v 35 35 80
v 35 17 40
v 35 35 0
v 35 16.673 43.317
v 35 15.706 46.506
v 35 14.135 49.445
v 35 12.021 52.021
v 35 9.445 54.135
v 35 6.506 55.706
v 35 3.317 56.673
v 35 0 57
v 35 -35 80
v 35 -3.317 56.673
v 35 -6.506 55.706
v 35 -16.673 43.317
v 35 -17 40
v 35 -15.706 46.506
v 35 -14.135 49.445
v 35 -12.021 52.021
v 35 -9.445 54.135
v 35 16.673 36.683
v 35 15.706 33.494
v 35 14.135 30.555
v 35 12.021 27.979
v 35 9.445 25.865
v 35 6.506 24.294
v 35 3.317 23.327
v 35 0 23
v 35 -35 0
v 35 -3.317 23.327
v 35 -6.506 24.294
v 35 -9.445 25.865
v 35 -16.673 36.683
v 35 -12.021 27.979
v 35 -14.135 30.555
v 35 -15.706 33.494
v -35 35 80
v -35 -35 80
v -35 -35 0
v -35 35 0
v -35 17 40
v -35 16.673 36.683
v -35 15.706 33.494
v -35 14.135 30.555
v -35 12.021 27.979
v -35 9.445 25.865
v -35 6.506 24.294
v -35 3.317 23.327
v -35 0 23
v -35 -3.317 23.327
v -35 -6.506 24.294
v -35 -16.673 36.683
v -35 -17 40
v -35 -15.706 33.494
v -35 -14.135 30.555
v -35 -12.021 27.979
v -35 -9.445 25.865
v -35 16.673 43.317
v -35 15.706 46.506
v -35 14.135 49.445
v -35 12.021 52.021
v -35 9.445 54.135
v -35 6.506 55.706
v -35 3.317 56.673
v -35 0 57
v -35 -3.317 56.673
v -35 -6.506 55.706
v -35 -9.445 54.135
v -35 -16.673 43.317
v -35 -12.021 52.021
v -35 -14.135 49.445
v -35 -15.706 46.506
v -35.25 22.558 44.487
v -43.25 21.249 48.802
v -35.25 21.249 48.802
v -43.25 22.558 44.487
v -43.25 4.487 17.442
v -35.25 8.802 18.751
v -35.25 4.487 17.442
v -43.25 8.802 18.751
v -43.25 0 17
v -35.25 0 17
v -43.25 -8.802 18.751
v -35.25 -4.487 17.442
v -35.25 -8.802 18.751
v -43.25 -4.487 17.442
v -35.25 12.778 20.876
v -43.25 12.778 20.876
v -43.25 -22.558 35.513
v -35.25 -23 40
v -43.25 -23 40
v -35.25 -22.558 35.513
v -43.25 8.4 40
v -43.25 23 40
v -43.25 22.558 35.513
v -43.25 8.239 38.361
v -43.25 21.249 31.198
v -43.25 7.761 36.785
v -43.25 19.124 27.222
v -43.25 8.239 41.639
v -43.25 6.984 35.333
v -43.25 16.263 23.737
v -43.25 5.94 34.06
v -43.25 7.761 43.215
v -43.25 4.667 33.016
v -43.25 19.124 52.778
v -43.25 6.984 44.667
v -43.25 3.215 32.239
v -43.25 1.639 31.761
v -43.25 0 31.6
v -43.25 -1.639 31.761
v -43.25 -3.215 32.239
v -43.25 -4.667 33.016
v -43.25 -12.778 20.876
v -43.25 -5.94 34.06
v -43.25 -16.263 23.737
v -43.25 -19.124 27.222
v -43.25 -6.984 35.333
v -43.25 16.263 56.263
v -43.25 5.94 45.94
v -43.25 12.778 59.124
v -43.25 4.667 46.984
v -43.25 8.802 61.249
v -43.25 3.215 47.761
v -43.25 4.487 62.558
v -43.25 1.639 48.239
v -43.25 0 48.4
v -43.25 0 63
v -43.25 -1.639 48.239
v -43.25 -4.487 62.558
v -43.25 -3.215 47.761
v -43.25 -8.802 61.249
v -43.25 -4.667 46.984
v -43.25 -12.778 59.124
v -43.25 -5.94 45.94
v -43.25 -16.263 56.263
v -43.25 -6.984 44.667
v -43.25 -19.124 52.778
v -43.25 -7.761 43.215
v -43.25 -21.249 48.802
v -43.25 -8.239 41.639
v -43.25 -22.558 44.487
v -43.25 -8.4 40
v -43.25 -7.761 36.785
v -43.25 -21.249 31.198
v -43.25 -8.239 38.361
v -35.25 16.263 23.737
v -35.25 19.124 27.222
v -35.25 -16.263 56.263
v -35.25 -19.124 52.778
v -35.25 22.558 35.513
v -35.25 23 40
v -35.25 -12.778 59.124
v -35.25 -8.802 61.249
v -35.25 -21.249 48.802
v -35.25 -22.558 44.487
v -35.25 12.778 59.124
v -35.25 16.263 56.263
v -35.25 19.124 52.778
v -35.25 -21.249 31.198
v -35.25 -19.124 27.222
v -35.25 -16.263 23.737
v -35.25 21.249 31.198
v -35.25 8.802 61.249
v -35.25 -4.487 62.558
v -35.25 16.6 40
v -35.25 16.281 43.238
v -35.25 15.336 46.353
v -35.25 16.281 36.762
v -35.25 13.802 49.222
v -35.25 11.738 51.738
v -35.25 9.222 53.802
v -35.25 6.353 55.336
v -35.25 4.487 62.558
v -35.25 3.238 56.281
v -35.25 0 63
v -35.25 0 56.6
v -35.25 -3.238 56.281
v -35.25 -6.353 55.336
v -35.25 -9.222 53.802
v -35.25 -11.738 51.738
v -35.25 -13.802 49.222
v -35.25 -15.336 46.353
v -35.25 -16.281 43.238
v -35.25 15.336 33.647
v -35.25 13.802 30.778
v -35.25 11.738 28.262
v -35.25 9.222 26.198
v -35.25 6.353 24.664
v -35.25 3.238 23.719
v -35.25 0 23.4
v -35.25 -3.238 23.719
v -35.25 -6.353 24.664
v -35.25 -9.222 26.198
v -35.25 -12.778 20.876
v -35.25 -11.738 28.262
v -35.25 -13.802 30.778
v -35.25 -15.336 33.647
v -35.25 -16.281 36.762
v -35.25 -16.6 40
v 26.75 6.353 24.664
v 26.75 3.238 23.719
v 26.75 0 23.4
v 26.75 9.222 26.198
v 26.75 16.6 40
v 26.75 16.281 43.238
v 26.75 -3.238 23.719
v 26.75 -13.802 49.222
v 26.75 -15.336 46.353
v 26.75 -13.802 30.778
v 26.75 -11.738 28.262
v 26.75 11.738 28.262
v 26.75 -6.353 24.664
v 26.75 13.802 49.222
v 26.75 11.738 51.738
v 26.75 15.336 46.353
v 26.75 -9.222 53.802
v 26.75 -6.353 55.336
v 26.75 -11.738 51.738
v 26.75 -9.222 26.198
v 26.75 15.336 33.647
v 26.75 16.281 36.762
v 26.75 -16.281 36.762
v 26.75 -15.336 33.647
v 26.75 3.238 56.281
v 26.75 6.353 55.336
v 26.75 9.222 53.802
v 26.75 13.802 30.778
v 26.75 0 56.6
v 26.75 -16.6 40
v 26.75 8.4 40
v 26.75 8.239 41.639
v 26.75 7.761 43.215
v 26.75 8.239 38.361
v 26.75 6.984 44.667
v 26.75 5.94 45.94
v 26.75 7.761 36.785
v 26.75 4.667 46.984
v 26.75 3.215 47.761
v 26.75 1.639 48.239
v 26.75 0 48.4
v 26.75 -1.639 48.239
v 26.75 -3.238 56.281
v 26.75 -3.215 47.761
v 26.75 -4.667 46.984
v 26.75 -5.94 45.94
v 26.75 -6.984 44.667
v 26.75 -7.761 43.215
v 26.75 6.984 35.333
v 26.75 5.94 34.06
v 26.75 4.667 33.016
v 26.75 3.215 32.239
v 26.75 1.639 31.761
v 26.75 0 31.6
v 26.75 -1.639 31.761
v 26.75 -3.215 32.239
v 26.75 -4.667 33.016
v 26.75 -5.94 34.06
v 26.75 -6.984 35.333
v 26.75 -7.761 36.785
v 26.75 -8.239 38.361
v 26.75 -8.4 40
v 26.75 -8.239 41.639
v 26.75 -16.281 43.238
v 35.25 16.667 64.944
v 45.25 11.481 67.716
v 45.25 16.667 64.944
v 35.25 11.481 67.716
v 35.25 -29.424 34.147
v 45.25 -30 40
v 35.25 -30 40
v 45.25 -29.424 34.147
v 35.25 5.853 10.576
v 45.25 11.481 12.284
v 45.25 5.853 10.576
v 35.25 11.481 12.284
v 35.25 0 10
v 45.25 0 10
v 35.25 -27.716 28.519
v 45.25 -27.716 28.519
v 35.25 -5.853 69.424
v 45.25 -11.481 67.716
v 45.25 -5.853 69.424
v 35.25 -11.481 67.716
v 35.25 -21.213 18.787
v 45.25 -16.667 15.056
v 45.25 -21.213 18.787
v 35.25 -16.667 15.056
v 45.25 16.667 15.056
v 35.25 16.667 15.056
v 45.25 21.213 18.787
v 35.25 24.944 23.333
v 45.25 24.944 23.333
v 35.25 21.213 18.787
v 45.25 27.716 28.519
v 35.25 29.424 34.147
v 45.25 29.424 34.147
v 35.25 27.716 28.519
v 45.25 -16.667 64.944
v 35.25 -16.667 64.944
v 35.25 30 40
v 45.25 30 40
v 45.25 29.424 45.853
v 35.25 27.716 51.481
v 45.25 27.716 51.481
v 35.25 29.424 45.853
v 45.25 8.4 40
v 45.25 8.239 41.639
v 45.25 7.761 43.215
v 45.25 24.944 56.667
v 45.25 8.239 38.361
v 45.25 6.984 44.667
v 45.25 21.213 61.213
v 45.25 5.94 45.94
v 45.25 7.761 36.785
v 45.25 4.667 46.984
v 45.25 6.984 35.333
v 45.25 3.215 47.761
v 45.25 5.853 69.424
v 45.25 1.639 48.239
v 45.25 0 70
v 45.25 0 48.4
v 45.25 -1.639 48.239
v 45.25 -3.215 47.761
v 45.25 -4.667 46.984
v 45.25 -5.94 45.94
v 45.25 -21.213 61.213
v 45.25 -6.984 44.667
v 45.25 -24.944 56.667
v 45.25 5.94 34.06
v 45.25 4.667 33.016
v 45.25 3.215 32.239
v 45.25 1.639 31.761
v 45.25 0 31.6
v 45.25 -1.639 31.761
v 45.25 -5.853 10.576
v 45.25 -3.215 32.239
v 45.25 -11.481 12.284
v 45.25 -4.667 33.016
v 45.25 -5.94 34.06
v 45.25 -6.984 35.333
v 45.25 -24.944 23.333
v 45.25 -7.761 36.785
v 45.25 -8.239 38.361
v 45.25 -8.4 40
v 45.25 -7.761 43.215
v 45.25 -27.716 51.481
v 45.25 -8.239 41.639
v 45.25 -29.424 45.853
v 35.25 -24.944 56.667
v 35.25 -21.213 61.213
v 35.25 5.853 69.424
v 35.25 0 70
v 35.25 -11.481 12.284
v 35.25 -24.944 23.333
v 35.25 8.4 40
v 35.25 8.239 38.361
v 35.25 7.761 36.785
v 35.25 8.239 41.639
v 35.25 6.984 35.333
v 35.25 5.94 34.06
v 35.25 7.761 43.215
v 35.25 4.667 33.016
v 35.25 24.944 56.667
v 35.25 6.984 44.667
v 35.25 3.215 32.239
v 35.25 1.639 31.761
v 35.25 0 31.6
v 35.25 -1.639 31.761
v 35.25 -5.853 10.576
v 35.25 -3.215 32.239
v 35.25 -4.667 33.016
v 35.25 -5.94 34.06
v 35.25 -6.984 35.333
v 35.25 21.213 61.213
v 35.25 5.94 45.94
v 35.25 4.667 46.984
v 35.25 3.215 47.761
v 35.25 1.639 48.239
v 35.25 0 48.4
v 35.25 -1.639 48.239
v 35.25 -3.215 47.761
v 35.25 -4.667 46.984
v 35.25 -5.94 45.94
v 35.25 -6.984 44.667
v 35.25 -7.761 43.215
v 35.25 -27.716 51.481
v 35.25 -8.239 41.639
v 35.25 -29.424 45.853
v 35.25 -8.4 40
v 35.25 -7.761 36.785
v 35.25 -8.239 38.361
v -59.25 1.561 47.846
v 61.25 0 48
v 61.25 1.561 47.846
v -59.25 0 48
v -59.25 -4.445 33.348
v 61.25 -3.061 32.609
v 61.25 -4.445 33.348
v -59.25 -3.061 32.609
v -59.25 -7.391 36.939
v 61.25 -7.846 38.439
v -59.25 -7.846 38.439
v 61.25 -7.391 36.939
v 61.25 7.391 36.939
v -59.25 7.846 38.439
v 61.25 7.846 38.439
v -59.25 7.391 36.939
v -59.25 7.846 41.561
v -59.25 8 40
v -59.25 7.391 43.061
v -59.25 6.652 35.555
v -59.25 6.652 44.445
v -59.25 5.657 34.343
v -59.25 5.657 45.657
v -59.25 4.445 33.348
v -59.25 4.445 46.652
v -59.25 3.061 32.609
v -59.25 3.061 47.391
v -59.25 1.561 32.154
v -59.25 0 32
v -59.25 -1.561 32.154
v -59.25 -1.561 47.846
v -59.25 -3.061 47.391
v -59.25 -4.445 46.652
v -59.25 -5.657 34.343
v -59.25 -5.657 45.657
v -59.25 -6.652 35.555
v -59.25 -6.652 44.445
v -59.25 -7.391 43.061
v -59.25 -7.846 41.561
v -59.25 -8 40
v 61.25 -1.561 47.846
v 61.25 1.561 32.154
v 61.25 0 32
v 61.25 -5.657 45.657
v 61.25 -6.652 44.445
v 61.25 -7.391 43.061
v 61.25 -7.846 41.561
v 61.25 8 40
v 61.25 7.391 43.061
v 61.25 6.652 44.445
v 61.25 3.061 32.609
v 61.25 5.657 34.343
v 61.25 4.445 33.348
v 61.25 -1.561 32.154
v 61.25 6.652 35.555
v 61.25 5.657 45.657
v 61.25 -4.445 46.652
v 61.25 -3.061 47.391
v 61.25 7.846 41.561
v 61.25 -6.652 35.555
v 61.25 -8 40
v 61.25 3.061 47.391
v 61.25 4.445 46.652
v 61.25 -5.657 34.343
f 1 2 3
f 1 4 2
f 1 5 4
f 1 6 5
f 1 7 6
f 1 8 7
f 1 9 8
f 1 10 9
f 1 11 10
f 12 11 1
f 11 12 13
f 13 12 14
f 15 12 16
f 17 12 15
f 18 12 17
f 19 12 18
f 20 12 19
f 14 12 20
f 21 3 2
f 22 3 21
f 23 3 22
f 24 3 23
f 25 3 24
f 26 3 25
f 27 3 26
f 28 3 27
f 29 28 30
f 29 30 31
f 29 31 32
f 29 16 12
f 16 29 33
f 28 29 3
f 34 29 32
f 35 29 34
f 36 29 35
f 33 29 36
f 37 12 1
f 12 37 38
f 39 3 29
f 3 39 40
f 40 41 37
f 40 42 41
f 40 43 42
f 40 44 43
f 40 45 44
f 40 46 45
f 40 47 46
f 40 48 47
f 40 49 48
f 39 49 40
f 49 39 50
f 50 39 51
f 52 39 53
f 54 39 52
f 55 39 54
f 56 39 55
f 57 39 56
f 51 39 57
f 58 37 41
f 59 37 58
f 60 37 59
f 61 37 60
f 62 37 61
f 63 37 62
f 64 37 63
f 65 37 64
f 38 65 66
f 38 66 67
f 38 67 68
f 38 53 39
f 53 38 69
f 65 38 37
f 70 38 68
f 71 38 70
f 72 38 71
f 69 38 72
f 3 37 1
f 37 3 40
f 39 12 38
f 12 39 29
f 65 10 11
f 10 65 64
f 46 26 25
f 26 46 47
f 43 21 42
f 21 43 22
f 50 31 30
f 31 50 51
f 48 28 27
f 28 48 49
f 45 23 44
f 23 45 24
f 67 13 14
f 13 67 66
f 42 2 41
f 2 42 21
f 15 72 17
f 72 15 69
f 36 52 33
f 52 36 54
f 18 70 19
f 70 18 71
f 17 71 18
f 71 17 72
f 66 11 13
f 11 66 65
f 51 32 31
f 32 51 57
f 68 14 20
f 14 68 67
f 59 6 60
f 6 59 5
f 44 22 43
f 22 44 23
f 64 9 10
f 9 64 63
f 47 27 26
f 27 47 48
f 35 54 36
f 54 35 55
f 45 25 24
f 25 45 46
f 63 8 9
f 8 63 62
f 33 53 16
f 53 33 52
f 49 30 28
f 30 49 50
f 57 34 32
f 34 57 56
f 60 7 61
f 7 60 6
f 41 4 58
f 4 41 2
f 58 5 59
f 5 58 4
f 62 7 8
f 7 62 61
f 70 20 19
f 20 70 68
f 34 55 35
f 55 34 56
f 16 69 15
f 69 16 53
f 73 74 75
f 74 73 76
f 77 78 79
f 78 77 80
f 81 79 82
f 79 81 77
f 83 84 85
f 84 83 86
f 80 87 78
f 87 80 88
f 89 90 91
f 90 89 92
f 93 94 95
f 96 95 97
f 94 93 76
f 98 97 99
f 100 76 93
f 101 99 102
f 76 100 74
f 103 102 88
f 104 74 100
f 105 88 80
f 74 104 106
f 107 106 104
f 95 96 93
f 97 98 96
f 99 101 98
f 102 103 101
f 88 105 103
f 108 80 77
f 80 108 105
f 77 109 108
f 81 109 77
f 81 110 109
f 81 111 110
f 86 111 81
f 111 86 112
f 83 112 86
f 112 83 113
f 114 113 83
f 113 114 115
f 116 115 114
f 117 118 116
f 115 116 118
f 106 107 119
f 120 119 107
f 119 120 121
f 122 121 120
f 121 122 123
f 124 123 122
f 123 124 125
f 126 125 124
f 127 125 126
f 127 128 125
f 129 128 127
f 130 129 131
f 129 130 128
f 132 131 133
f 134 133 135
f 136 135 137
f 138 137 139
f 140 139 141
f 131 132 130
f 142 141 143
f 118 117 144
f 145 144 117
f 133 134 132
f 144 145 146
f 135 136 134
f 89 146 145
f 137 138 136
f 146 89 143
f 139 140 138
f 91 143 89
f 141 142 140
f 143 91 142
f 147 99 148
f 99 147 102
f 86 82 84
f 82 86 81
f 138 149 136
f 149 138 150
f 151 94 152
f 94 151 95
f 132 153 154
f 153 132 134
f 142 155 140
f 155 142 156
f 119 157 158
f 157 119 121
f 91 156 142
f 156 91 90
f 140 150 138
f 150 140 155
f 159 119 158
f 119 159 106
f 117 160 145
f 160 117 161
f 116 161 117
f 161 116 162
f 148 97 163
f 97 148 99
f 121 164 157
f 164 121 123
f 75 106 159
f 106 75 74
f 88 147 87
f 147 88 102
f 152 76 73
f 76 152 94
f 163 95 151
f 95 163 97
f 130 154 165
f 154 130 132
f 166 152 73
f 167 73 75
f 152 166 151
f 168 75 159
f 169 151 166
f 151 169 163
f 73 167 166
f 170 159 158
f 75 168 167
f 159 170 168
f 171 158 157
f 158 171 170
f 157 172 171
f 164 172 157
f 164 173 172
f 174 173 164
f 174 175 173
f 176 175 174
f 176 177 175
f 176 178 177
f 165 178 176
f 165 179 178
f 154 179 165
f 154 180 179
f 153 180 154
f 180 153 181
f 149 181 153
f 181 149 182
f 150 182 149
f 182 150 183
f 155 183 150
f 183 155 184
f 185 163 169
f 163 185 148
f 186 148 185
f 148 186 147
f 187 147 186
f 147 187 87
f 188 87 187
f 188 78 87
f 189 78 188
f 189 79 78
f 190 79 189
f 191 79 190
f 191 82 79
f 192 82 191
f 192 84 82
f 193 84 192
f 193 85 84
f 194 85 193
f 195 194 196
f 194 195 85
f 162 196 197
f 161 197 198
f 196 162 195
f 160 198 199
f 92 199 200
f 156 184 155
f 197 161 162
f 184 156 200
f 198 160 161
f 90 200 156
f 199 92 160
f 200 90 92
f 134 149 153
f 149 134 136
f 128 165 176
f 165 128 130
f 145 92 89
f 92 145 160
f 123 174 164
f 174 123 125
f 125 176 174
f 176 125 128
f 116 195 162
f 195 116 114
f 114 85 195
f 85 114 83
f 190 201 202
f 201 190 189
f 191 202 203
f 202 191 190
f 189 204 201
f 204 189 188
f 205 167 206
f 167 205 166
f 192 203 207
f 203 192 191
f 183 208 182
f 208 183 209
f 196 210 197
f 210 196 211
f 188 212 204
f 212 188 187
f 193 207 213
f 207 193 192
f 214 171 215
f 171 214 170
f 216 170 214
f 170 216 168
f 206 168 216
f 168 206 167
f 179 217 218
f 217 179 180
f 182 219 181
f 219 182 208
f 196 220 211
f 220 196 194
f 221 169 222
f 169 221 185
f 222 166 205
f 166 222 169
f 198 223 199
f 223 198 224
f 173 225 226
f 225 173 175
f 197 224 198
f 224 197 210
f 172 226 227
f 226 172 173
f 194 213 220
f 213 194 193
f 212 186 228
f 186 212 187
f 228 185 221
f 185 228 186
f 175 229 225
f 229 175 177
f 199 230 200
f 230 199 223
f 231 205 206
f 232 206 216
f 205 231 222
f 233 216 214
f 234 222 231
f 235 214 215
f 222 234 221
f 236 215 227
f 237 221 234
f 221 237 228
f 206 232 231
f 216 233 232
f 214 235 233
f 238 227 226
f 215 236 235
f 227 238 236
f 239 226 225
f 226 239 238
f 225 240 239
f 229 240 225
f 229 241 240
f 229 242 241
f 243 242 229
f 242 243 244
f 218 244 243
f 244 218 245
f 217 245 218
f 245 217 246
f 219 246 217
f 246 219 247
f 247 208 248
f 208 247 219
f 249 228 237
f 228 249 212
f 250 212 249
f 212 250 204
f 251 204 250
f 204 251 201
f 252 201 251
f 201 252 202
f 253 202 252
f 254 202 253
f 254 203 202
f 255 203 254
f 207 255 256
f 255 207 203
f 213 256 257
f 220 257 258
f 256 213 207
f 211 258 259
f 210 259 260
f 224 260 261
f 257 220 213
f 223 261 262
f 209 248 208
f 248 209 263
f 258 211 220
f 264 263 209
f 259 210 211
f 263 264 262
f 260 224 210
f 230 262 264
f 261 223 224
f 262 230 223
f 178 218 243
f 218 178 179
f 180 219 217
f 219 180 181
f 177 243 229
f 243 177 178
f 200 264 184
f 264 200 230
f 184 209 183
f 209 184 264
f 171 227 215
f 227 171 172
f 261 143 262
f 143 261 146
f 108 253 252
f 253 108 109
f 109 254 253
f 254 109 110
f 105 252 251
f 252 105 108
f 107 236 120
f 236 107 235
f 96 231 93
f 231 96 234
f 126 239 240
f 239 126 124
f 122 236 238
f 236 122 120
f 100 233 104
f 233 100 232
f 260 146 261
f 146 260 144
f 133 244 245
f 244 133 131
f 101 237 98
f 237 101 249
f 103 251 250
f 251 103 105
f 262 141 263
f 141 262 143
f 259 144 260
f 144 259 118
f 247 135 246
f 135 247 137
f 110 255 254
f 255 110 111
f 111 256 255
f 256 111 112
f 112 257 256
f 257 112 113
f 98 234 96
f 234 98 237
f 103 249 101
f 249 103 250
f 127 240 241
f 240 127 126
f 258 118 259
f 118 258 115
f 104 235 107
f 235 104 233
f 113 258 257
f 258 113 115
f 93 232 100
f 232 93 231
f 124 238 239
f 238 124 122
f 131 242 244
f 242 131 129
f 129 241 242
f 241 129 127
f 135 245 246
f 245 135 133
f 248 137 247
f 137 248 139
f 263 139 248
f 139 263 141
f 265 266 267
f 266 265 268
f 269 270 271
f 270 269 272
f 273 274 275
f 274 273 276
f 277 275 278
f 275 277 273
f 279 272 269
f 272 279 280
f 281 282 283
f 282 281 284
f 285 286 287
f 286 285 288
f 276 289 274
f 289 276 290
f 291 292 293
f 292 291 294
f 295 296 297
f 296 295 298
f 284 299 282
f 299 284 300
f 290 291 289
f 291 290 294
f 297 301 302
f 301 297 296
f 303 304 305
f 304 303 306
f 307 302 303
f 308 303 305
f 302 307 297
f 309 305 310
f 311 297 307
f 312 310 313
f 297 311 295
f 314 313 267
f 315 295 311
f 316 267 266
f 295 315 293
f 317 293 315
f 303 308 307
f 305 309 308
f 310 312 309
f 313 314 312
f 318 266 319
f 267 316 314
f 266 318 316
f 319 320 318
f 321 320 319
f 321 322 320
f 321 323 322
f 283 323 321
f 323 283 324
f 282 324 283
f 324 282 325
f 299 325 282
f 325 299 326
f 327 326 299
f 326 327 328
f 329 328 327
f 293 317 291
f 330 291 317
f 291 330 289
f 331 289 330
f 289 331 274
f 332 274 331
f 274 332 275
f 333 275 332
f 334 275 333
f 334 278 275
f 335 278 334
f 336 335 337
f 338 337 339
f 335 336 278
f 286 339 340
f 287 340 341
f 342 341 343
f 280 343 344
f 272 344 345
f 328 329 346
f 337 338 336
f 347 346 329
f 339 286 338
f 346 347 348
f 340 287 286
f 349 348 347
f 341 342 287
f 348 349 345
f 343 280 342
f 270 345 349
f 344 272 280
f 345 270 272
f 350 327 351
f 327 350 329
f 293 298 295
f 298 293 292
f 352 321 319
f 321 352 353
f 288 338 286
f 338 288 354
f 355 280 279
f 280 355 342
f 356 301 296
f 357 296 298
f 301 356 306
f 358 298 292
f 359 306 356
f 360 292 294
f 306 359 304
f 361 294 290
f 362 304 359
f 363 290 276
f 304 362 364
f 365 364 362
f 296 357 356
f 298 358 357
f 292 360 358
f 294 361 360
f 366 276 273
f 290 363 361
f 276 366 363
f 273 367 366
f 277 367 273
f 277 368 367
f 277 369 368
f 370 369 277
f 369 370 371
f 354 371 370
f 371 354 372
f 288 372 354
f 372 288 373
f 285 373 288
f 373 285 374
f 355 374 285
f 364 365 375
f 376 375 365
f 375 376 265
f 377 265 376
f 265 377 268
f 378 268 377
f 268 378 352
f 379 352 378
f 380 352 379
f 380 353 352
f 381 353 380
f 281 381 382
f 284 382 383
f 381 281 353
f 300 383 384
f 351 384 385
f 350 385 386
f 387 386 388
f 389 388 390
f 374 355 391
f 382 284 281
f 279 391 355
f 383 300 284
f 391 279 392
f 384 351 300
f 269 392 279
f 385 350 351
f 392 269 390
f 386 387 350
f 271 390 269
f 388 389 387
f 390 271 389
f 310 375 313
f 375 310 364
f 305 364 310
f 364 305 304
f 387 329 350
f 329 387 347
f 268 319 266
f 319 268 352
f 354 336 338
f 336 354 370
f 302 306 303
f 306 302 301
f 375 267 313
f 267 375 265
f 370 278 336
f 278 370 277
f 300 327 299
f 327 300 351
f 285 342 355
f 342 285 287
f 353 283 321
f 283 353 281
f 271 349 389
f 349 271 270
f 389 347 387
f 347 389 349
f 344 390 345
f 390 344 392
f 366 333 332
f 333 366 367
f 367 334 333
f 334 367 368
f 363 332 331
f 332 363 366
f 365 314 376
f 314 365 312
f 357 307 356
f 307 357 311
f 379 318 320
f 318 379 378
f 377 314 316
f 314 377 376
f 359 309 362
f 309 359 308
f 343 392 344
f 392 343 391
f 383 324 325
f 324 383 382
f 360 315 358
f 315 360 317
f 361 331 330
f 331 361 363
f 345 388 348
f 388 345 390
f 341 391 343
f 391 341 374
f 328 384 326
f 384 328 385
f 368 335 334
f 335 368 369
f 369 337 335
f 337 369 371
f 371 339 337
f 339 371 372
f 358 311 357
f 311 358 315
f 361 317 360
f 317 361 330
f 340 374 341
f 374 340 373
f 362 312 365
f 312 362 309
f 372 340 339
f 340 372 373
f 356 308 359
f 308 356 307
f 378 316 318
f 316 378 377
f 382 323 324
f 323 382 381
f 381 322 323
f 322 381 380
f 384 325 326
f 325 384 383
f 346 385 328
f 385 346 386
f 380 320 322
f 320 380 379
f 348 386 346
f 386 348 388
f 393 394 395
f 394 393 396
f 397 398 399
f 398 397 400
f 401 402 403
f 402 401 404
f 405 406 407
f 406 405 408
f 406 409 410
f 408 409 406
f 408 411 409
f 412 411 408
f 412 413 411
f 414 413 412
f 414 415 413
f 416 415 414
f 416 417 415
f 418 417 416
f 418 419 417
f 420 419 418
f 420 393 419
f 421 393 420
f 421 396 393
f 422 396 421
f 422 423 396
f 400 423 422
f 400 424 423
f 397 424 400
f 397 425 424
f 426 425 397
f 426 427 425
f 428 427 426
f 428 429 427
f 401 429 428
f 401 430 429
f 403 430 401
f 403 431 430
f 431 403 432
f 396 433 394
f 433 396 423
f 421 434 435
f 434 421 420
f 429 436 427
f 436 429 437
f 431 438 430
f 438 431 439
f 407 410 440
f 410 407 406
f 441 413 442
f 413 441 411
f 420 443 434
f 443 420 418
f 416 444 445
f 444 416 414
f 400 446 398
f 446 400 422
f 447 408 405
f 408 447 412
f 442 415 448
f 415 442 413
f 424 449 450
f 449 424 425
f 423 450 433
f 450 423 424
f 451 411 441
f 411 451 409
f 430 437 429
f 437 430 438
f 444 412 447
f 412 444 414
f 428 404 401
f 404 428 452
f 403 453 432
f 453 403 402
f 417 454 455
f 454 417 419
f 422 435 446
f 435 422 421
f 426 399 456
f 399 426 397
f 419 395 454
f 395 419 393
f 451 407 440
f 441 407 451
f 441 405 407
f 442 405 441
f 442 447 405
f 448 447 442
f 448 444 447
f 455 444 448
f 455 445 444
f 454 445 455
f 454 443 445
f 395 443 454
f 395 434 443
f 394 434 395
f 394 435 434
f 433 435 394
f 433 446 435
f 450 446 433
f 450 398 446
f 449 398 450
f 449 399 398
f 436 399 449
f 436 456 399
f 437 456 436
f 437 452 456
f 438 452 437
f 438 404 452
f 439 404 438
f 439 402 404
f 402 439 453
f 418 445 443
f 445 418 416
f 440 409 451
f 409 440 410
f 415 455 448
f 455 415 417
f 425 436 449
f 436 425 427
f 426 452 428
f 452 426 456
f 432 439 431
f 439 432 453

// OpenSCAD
$fn = 32;

// ------------------------------------------------------------------------
// Bushed housing: 70 x 70 x 80 mm housing, bushing d33.2
// Every part is its own module, assembly() places them once.
// ------------------------------------------------------------------------

// --- part 1 ---
module housing() {
  difference() {
    translate([-35, -35, 0]) cube([70, 70, 80]);
    translate([0, 0, 40]) rotate([0, 90, 0]) cylinder(h = 72, d = 34, center = true);
  }
}

// --- part 2 ---
module bushing() {
  difference() {
    union() {
      cylinder(h = 8, d = 46);
      translate([0, 0, 8]) cylinder(h = 62, d = 33.2);
    }
    translate([0, 0, -1]) cylinder(h = 72, d = 16.8);
  }
}

// --- part 3 ---
module shaft() {
  translate([0, 0, -60.25]) cylinder(h = 120.5, d = 16);
}

// --- part 4 ---
module cover() {
  difference() {
    cylinder(h = 10, d = 60);
    translate([0, 0, -1]) cylinder(h = 12, d = 16.8);
  }
}

// --- assembly ---
module assembly() {
  translate([0, 0, 0]) rotate([0, 0, 0]) housing();
  translate([-43.25, 0, 40]) rotate([0, 90, 0]) bushing();
  translate([1, 0, 40]) rotate([0, 90, 0]) shaft();
  translate([35.25, 0, 40]) rotate([0, 90, 0]) cover();
}

assembly();
